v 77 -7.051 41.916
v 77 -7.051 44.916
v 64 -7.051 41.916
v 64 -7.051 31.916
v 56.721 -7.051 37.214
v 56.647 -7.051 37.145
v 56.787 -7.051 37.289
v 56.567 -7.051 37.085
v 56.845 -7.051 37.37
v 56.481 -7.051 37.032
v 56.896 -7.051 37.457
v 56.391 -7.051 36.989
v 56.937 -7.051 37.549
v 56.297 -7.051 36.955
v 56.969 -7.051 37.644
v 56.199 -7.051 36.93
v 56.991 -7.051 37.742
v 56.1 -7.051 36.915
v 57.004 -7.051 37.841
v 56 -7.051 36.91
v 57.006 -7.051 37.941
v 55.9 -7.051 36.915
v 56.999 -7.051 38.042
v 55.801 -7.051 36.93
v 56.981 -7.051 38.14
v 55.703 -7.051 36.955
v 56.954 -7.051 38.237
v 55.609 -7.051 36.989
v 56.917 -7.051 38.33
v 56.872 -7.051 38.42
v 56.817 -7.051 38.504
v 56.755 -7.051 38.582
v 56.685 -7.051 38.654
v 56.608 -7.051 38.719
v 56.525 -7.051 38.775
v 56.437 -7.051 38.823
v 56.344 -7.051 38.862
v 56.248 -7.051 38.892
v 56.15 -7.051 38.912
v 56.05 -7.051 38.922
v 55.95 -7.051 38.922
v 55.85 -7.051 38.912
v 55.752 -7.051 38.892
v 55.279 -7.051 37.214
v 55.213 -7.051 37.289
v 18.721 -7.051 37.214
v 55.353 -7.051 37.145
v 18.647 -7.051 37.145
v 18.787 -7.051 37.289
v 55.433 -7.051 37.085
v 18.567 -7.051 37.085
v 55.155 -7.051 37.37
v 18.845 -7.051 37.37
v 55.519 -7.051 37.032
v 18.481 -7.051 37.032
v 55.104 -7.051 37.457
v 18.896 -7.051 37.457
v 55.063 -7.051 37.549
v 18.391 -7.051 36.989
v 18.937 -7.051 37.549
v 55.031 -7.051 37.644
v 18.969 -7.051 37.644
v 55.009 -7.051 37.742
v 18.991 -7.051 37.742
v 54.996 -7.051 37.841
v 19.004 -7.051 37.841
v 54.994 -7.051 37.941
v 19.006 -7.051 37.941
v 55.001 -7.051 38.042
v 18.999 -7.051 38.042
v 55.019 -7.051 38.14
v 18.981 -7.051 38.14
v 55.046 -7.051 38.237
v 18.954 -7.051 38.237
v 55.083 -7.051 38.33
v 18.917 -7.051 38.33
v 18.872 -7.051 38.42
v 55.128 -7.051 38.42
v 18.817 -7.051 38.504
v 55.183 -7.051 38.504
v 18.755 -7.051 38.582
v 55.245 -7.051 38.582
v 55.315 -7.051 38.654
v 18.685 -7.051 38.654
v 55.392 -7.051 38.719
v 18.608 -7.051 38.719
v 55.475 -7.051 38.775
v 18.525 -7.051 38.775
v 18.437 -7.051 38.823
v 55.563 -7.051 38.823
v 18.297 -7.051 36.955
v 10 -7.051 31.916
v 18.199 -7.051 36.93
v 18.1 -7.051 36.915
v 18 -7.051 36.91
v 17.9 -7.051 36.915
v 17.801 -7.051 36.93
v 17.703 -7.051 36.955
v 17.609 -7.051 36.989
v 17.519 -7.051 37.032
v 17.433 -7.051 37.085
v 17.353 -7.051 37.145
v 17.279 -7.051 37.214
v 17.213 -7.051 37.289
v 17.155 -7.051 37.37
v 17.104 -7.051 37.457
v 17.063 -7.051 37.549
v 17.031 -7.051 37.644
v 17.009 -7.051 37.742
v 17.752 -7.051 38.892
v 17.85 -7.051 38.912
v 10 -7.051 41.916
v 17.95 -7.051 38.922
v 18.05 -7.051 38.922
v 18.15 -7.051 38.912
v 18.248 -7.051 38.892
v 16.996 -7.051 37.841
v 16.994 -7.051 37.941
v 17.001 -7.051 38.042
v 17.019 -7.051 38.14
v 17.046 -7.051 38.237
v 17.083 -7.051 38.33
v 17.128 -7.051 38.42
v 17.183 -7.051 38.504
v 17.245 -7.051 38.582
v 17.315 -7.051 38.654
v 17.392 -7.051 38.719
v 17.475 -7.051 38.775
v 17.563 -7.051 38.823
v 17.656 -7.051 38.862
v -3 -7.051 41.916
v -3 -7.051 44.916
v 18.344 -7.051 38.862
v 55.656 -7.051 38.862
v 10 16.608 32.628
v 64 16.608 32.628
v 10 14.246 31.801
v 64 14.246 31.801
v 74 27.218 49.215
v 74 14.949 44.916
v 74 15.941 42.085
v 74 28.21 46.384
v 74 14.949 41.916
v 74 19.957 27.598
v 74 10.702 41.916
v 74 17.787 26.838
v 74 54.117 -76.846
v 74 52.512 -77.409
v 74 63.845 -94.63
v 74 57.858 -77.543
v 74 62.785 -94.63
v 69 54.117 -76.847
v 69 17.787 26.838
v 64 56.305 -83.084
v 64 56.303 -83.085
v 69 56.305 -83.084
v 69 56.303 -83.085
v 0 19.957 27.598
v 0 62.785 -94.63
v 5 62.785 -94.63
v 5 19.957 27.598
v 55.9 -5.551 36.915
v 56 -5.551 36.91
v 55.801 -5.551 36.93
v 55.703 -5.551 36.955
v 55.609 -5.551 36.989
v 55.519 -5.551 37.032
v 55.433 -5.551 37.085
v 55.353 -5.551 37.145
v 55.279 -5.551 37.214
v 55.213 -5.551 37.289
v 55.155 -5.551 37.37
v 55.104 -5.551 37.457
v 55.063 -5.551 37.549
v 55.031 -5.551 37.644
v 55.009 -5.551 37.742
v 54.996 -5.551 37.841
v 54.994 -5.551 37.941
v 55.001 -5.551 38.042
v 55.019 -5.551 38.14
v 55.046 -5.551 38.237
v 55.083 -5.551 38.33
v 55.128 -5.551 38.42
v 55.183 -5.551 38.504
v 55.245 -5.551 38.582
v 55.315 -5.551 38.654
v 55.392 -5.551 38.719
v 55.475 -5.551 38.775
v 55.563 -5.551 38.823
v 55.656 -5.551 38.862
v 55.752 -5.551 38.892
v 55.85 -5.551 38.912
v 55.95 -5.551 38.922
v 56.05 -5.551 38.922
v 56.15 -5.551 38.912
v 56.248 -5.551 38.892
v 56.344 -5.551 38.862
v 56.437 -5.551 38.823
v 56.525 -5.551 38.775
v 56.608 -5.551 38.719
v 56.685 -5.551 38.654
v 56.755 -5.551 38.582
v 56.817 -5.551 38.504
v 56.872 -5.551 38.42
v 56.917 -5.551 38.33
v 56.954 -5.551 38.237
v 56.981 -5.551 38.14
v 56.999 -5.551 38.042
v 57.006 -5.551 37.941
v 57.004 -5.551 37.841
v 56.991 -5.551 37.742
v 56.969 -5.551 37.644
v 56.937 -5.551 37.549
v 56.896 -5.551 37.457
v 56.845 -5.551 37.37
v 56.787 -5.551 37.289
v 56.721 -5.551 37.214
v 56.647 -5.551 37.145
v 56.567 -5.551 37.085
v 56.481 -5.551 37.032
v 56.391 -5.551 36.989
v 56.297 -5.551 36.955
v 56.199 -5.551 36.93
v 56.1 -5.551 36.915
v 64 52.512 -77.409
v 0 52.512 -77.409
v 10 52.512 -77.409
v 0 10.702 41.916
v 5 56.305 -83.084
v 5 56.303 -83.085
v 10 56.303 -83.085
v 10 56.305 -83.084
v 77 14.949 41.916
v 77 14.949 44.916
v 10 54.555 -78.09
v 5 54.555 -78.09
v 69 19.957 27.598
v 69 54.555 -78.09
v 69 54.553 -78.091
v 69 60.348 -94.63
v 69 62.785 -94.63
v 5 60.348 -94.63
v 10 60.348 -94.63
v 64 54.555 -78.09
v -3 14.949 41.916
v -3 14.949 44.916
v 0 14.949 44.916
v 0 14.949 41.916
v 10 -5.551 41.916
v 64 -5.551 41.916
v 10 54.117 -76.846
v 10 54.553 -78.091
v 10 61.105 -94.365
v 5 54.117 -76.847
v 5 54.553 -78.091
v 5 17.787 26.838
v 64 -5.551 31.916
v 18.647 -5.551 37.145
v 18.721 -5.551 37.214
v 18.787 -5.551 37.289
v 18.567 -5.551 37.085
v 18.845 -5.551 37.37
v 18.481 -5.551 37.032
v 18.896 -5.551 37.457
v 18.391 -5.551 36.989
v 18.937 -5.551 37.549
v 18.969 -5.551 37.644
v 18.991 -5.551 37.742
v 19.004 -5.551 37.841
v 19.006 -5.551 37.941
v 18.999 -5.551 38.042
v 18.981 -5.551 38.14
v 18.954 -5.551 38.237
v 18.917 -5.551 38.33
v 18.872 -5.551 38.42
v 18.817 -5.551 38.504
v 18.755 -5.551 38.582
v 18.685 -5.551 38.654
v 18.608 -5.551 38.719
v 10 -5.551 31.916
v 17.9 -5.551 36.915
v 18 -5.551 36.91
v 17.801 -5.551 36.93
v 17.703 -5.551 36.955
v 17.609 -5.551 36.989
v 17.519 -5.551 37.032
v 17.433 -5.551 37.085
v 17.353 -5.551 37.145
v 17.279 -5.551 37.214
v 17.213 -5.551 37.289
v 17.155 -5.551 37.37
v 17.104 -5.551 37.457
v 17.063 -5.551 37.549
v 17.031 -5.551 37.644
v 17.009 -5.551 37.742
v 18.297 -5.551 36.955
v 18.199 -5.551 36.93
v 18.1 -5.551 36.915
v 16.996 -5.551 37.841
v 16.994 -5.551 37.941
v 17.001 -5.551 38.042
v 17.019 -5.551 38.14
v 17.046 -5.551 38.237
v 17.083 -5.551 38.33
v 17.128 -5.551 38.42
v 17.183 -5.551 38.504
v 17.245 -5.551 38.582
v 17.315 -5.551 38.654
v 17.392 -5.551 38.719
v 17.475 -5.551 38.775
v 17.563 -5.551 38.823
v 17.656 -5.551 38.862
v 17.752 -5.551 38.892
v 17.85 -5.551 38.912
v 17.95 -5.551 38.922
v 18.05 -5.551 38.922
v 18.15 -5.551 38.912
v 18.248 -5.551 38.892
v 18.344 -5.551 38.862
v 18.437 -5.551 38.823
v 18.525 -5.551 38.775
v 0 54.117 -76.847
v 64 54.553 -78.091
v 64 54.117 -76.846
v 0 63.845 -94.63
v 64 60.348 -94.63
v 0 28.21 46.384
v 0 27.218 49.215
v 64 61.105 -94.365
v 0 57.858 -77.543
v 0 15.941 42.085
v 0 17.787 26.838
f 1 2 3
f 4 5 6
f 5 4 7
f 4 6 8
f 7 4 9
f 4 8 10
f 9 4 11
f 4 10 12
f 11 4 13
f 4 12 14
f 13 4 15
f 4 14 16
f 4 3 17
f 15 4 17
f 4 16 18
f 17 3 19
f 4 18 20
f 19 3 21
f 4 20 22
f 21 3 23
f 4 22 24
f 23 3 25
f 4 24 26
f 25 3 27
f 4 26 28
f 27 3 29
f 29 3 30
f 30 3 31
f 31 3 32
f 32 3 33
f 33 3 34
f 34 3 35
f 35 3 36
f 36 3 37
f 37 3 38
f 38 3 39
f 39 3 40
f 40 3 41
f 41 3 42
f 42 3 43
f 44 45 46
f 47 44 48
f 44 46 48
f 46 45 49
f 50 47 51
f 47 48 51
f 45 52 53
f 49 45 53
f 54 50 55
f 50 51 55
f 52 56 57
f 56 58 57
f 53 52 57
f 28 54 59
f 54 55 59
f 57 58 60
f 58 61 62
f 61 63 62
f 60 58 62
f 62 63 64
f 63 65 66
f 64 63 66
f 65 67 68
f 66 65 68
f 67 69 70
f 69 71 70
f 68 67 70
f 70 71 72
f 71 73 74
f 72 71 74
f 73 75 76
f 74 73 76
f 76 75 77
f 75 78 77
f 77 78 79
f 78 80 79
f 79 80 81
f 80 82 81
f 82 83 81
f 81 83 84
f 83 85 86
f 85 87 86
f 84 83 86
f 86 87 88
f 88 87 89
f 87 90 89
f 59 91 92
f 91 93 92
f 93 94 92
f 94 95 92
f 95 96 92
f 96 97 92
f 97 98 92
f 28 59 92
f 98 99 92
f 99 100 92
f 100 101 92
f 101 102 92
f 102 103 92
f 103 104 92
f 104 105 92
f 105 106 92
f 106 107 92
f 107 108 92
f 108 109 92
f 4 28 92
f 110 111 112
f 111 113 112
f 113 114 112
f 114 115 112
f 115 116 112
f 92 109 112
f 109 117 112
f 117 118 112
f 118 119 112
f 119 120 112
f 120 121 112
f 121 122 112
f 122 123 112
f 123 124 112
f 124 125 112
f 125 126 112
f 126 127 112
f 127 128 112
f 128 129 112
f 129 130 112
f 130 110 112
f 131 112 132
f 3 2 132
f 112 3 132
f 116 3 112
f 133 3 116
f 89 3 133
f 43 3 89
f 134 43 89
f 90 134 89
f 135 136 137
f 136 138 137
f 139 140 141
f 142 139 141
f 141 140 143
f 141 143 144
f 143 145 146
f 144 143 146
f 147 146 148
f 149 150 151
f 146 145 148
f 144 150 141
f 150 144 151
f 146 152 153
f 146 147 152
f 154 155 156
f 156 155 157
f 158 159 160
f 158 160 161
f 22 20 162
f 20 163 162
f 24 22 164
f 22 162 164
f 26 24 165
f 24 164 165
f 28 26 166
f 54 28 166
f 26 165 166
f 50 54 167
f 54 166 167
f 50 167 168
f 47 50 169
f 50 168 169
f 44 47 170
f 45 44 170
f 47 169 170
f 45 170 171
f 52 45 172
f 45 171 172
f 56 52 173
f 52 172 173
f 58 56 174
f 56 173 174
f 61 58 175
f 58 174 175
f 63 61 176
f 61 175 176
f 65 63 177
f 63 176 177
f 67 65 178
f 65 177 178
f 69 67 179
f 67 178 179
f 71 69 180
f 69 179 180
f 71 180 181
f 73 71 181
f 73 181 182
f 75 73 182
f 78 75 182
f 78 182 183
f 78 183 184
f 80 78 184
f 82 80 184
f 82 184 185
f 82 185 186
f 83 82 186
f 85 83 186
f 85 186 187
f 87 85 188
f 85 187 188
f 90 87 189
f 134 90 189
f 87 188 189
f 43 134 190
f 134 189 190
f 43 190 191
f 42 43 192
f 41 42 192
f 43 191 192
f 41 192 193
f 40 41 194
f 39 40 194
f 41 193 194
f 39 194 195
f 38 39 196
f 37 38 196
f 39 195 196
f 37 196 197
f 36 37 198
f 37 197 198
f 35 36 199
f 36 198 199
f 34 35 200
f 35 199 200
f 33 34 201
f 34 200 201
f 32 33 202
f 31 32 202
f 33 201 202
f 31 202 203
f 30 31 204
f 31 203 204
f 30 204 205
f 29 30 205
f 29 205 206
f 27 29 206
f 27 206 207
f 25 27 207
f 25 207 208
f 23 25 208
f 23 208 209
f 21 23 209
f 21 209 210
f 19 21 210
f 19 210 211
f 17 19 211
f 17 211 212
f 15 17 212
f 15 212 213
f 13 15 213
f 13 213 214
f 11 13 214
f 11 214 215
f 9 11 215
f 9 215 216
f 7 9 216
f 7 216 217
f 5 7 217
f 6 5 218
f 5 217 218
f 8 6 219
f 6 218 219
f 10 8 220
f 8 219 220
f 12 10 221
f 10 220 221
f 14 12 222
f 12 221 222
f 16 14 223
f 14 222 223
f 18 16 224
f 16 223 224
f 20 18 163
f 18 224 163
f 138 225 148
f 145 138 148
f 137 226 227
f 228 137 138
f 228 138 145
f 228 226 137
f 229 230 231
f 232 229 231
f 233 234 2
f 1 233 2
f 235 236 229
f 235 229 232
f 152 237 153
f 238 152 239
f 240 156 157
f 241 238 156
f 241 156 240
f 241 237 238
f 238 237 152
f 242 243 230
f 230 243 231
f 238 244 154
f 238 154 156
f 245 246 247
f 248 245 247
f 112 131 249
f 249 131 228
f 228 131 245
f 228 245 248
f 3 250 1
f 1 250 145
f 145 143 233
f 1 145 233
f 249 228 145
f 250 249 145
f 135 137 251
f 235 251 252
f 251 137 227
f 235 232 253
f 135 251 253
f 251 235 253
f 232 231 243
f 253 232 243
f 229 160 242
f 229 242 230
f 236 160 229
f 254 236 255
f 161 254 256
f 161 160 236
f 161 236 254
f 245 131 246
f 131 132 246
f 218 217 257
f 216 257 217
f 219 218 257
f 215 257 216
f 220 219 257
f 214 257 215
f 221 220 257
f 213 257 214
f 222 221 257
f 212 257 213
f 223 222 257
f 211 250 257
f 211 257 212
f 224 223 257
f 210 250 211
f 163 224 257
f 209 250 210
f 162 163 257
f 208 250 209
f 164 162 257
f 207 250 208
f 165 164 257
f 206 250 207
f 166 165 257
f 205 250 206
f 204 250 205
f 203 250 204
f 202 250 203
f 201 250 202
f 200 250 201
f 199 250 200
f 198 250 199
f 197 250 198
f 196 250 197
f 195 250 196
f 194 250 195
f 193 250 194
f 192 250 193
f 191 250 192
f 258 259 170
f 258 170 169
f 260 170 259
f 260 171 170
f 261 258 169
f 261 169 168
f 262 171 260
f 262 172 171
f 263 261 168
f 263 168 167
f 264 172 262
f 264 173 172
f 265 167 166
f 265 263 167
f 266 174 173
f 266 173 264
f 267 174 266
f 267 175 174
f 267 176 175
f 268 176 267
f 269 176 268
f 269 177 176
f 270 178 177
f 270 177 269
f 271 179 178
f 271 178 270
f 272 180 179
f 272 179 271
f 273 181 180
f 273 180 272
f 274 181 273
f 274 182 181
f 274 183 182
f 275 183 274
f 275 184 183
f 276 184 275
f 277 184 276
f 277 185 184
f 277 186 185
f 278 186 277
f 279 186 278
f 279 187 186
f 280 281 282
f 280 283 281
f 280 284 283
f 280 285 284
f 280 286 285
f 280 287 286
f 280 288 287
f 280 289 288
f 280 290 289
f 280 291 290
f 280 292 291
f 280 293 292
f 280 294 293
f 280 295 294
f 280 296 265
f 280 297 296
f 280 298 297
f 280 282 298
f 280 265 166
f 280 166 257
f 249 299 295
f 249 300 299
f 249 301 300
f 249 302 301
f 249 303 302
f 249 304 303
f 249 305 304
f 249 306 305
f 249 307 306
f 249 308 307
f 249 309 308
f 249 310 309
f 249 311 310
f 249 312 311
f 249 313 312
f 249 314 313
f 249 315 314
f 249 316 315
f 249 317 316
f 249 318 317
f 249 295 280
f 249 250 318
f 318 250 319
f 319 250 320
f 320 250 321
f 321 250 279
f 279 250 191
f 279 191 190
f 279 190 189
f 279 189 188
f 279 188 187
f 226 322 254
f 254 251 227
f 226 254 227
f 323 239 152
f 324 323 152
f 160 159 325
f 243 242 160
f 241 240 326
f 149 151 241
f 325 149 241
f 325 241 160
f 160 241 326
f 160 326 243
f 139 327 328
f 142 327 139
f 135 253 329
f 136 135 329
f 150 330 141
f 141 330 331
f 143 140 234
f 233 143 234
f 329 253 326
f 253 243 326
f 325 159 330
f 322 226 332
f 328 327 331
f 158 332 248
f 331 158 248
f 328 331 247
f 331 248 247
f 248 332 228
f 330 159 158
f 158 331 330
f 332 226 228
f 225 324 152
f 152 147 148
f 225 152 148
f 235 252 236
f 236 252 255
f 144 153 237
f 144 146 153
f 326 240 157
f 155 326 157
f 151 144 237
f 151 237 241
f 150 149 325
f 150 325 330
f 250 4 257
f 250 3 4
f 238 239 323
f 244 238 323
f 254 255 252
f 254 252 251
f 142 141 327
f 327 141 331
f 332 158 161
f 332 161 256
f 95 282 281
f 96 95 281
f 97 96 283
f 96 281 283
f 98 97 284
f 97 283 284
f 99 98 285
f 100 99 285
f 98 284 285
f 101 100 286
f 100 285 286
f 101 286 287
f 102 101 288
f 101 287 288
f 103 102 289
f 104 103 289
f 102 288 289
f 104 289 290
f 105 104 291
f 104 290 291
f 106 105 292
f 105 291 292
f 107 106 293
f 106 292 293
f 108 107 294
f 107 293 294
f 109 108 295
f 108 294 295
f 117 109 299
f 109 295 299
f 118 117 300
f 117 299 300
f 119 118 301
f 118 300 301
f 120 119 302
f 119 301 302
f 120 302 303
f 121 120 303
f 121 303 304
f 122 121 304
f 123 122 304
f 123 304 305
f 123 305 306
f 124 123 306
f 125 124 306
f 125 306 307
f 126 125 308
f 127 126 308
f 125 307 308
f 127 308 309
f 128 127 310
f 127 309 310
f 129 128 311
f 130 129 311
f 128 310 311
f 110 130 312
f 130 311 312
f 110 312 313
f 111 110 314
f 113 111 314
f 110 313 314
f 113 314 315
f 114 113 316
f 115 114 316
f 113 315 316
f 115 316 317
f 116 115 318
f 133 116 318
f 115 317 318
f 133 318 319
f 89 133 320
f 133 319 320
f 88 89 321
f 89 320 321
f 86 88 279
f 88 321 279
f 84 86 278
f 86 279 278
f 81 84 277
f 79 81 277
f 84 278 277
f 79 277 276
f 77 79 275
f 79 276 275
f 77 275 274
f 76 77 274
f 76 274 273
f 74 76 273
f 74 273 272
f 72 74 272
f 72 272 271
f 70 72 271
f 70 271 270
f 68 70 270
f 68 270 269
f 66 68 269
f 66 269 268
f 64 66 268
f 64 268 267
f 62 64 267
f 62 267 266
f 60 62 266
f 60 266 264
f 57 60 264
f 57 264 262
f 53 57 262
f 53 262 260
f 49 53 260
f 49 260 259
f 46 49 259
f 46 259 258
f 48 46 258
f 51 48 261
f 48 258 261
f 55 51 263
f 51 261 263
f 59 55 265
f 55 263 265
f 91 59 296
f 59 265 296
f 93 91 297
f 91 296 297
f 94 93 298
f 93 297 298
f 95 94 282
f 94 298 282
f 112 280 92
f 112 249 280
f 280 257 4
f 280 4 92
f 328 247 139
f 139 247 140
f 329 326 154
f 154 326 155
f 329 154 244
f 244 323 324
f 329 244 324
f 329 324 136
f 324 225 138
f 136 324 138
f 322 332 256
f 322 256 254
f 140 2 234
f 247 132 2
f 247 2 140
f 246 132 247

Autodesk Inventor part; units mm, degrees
ref_plane "YZ Plane" through (0, 0, 0) normal (1, 0, 0) x (0, 1, 0)
ref_plane "XZ Plane" through (0, 0, 0) normal (0, 1, 0) x (-1, 0, 0)
ref_plane "XY Plane" through (0, 0, 0) normal (0, 0, 1) x (1, 0, 0)
sketch "草图1" plane through (0, 0, 0) normal (1, 0, 0) x (0, 1, 0)
  line L0 (-7.0511, 44.9164) -> (14.9489, 44.9164)
  line L1 (59.1261, -96.2836) -> (10.702, 41.9164)
  line L2 (10.702, 41.9164) -> (-7.0511, 41.9164)
  line L3 (-7.0511, 41.9164) -> (-7.0511, 44.9164)
  line L4 (57.8575, -77.5428) -> (14.9489, 44.9164)
  line L5 (63.8448, -94.6302) -> (59.1261, -96.2836)
  line L6 (63.8448, -94.6302) -> (57.8575, -77.5428)
  line L7 (10.702, 41.9164) -> (10.702, 44.9164)
  line L8 (14.9489, 44.9164) -> (14.9489, 41.9164)
  point P0 (0, 0)
  dimension "d1" = 3
  dimension "d2" = 109.31
  dimension "d3" = 138.2
  dimension "d10" = 5
  dimension "d90" = 22
extrude "拉伸1" add sketch "草图1" along normal blind 74
sketch "草图4" plane through (0, 14.9489, 44.9164) normal (0, 0.9437433, 0.3306791) x (1, 0, 0)
  line L0 (74, 3) -> (0, 3)
  line L1 (0, 3) -> (0, 0)
  line L2 (0, 0) -> (74, 0)
  line L3 (74, 0) -> (74, 3)
  line L4 (0, 0) -> (74, 0) projected
  line L5 (74, 147.865) -> (74, 0) projected
  line L6 (0, 0) -> (0, 147.865) projected
  point P0 (0, 37.4463)
  point P1 (67.5, 129.877)
  point P2 (0, 129.877)
  dimension "d11" = 3
extrude "拉伸3" add sketch "草图4" along normal blind 13
sketch "草图5" plane through (74, 0, 0) normal (1, 0, 0) x (0, 0, -1)
  line L0 (-27.5984, 19.9574) -> (113.9631, 69.5592)
  line L1 (113.9631, 69.5592) -> (114.7237, 67.3886)
  line L2 (114.7237, 67.3886) -> (-26.8378, 17.7868)
  line L3 (-26.8378, 17.7868) -> (-27.5984, 19.9574)
  line L4 (94.6302, 63.8448) -> (-42.0852, 15.9409) projected
  line L5 (-42.0852, 15.9409) -> (-40.3206, 10.9047)
  point P0 (0, 0)
  point P1 (78.0607, 56.3152)
  dimension "d15" = 1
  dimension "d16" = 150
  dimension "d17" = 2.3
  dimension "d22" = 15
extrude "拉伸4" cut sketch "草图5" against normal blind 5
sketch "草图6" plane through (0, 0, 0) normal (-1, 0, 0) x (0, 0, 1)
  line L0 (-113.9631, 69.5592) -> (27.5984, 19.9574)
  line L1 (27.5984, 19.9574) -> (26.8378, 17.7868)
  line L2 (26.8378, 17.7868) -> (-114.7237, 67.3886)
  line L3 (-114.7237, 67.3886) -> (-113.9631, 69.5592)
  line L4 (42.0852, 15.9409) -> (-94.6302, 63.8448) projected
  line L5 (42.0852, 15.9409) -> (38.373, 5.3464)
  point P0 (0, 0)
  point P1 (-78.0607, 56.3152)
  dimension "d20" = 1
  dimension "d21" = 2.3
  dimension "d23" = 15
  dimension "d24" = 150
extrude "拉伸5" cut sketch "草图6" against normal blind 5
sketch "草图8" plane through (74, 0, 0) normal (1, 0, 0) x (0, 0, -1)
  line L0 (96.2836, 59.1261) -> (95.7214, 60.7304)
  line L1 (95.7214, 60.7304) -> (76.8465, 54.1168)
  line L2 (76.8465, 54.1168) -> (77.4087, 52.5125)
  line L3 (77.4087, 52.5125) -> (96.2836, 59.1261)
  line L4 (96.2836, 59.1261) -> (95.7214, 60.7304) projected
  line L5 (-41.9164, 10.702) -> (96.2836, 59.1261) projected
  line L6 (95.7214, 60.7304) -> (-26.8378, 17.7868) projected
  point P0 (0, 0)
  point P1 (84.6027, 53.1652)
  dimension "d32" = 20
extrude "拉伸7" cut sketch "草图8" against normal blind 100
sketch "草图9" plane through (0, -7.0511, 44.9164) normal (0, 0, 1) x (1, 0, 0)
  line L0 (-3, 22) -> (77, 22)
  line L1 (77, 22) -> (77, 0)
  line L2 (77, 0) -> (-3, 0)
  line L3 (-3, 0) -> (-3, 22)
  line L4 (0, 22) -> (74, 22) projected
  line L5 (0, 0) -> (74, 0) projected
  line L6 (0, 0) -> (0, 22) projected
  line L7 (74, 22) -> (74, 0) projected
  point P0 (0, 7.0511)
  dimension "d35" = 3
  dimension "d36" = 3
extrude "拉伸8" add sketch "草图9" against normal blind 3 contours L0 L6 L2 L3 | L0 L1 L2 L7
sketch "草图10" plane through (74, 10.702, 41.9164) normal (0, 0, -1) x (-1, 0, 0)
  line L0 (10, -16.2531) -> (64, -16.2531)
  line L1 (64, -16.2531) -> (64, -17.7531)
  line L2 (64, -17.7531) -> (10, -17.7531)
  line L3 (10, -17.7531) -> (10, -16.2531)
  line L4 (-3, -17.7531) -> (77, -17.7531) projected
  line L5 (0, 0) -> (0, 41.8104) projected
  line L6 (77, -17.7531) -> (77, 4.2469) projected
  line L7 (74, 41.8104) -> (74, 0) projected
  point P0 (74, -10.702)
  point P1 (0, 38.8623)
  point P2 (67.5, 38.8623)
  point P3 (80, 48.424)
  dimension "d39" = 1.5
  dimension "d40" = 10
  dimension "d55" = 10
extrude "拉伸9" add sketch "草图10" along normal blind 10
sketch "草图11" plane through (-3, -7.0511, 44.9164) normal (0, -1, 0) x (1, 0, 0)
  line L0 (77, -3) -> (77, -122.3251) projected
  line L1 (3, -122.3251) -> (3, -3) projected
  line L2 (0, 0) -> (80, 0) projected
  line L3 (80, -3) -> (67, -3) projected
  line L4 (13, -3) -> (13, -13) projected
  line L5 (67, -13) -> (13, -13) projected
  point P0 (3, -44.9164)
  point P1 (59, -7)
  point P2 (21, -7)
  point P3 (70.75, -123.9692)
  point P4 (3.25, -123.9692)
  point P5 (3.25, -141.2)
  dimension "d44" = 18
  dimension "d45" = 18
  dimension "d53" = 7
  dimension "d54" = 7
  dimension "d56" = 3
  dimension "d57" = 8
  dimension "d58" = 6
hole "孔1" at (56, -7.0511, 37.9164) at (18, -7.0511, 37.9164) direction (0, 1, 0) diameter 2.013 depth 2 tip angle 118 thread size "M2.5x0.45" class "6H" standard "ANSI Metric M Profile"
sketch "草图21" plane through (74, 0, 0) normal (1, 0, 0) x (0, 0, -1)
  line L0 (-42.0852, 15.9409) -> (94.6302, 63.8448) projected
  line L1 (94.6302, 63.8448) -> (95.8266, 63.8448)
  line L2 (95.8266, 63.8448) -> (95.8266, 58.5781)
  line L3 (95.8266, 58.5781) -> (94.6302, 58.5781)
  line L4 (94.6302, 58.5781) -> (94.6302, 63.8448)
  point P0 (0, 0)
extrude "拉伸14" cut sketch "草图21" against normal blind 150
sketch "草图22" plane through (0, 10.702, 41.9164) normal (0, -0.9437433, -0.3306791) x (1, 0, 0)
  line L0 (5, -145.2818) -> (69, -145.2818) projected
  line L1 (64, -10.7184) -> (10, -10.7184)
  line L2 (10, -10.7184) -> (10, -145.2818)
  line L3 (10, -145.2818) -> (64, -145.2818)
  line L4 (64, -145.2818) -> (64, -10.7184)
  line L5 (74, 0) -> (74, -126.4381) projected
  line L6 (0, -126.4381) -> (0, 0) projected
  line L7 (74, -16.5731) -> (74, -146.0877) projected
  line L8 (69, -145.2818) -> (69, -146.0877) projected
  point P0 (0, -36.0194)
  point P1 (67.5, -127.0584)
  point P2 (0, -127.0584)
  point P3 (74, -146.0877)
  point P4 (64, -145.2818)
  point P5 (80, -133.0485)
  point P6 (0, -133.0485)
  point P7 (12, -145.2818)
  point P8 (0, -146.4381)
  point P9 (64, -145.2818)
  dimension "d74" = 10
  dimension "d75" = 10
  dimension "d76" = 5
extrude "拉伸15" cut sketch "草图22" against normal blind 2.5
sketch "草图25" plane through (0, 10.702, 41.9164) normal (0, -0.9437433, -0.3306791) x (1, 0, 0)
  line L0 (0, -126.4381) -> (0, 0) projected
  line L1 (69.9045, -127.7568) -> (0, -127.7568)
  line L2 (0, -127.7568) -> (0, -133.0485)
  line L3 (0, -133.0485) -> (69.9045, -133.0485)
  line L4 (69.9045, -133.0485) -> (69.9045, -127.7568)
  point P0 (0, -36.0194)
  point P1 (0, -127.7568)
extrude "拉伸16" cut sketch "草图25" against normal blind 1.7
properties part number "cover"
